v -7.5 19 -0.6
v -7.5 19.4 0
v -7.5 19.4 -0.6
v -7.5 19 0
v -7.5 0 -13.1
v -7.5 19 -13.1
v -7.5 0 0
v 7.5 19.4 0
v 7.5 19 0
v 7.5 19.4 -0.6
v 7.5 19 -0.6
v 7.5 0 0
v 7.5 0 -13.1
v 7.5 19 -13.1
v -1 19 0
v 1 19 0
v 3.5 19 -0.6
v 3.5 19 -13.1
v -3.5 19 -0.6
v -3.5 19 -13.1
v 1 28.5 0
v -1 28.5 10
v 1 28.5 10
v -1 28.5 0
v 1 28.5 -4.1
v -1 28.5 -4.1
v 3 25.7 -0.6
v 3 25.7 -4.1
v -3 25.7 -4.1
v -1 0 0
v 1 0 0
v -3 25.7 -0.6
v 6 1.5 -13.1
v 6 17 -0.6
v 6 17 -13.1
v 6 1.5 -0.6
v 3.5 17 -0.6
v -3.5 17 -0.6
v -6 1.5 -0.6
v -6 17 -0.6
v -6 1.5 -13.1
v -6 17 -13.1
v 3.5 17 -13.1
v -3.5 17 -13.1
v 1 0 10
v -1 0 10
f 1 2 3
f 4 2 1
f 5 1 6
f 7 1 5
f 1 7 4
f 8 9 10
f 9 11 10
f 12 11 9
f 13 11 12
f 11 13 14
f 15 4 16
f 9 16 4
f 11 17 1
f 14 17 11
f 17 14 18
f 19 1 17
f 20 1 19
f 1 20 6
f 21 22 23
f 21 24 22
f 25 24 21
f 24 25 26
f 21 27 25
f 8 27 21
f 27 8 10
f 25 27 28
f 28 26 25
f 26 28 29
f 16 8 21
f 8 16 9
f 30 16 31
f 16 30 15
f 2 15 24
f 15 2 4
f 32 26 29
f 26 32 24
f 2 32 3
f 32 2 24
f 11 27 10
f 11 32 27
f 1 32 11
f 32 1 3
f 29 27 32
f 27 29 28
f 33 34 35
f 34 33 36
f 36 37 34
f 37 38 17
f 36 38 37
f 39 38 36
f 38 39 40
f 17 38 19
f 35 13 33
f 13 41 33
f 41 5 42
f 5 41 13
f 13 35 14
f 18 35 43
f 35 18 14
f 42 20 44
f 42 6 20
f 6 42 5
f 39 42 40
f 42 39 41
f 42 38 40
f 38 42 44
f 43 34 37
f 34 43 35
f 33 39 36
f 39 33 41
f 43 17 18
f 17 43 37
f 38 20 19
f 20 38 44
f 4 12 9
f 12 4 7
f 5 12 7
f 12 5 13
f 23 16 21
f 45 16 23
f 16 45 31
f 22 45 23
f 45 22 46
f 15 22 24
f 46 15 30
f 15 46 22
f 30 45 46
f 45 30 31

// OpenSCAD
// file: ../config/colors.scad
/* RailEduKit/InteractiveSignallingLaboratory © 2025 by Martin Scheidt and contributors
 * License: CC-BY 4.0 - https://creativecommons.org/licenses/by/4.0/
 * Project description: The Interactive Signalling Laboratory is a tool for training in Rail
 * Applications to enhance the knowledge of control and signalling principles for rail transport systems.
 *
 * Module: config/colors.scad
 */

// component colors
BASE_COLOR = [0.25, 0.25, 0.25];// lighter black to see the shapes
INDICATOR_COLOR = "white";
ROUTE_COLOR = [0.255, 0.412, 0.882]; //[0.396, 0.467, 0.702];

METALLIC_GREY = [0.474, 0.482, 0.482];



// signal colors
ASPECT_CLEAR = "green";
ASPECT_APPROACH = "yellow";
ASPECT_STOP = "red";
// main file
/* RailEduKit/InteractiveSignallingLaboratory © 2025 by Martin Scheidt and contributors
 * License: CC-BY 4.0 - https://creativecommons.org/licenses/by/4.0/
 * Project description: The Interactive Signalling Laboratory is a tool for training in Rail
 * Applications to enhance the knowledge of control and signalling principles for rail transport systems.
 *
 * Module: switch_locker
 */

// this locker can be combined with the mechanical switch of BRIO https://www.brio.co.uk/en-GB/products/railway-toys/train-tracks/mechanical-switches-63334400

// Include configuration file
include <../config/global_variables.scad>
include <../config/colors.scad>

module wedge(y_value) {
    hull(){
        translate([0,0,-sl_wedge_height+nozzle_diameter/2])
        rotate([90,0,0])
        cylinder(d=nozzle_diameter, h= y_value);
        translate([-sl_wedge_width/2, -y_value, -0.2]) //sl_depth-y_value
        cube([sl_wedge_width, y_value, 0.2]);
    }
}

module half_circle(diameter) {
    difference() {
        sphere(d = diameter);
        translate([0, diameter/2, 0])
        cube([diameter, diameter, diameter],center=true);
    }
}

module brio_switch_handle() {
    // the half circle is needed, otherwise the locker moves upwards if you move the switch
    translate([0, 0, 0]) // y: handle_curve_h if you use half circle
    cube([brio_handle_diameter, brio_handle_depth, brio_handle_height]); // y: -handle_curve_h if you use half circle

    //brio sxis
    translate([(brio_handle_diameter-brio_axis_diameter)/2,brio_handle_depth,0])
    cube([brio_axis_diameter, 5, brio_handle_height]);

    // half circle
    //translate([(brio_handle_diameter)/2, handle_curve_h, (brio_handle_diameter)/2]) 
    //scale([1,handle_curve_h/((brio_handle_diameter)/2),1])
    //half_circle(brio_handle_diameter);

}

module barrier() {
    difference(){
        difference(){
            cube([sl_barrier_width, sl_barrier_depth, sl_barrier_height]);
            //TODO cut the cube to gain more flexibilaty while installation
            translate([wall_thickness,wall_thickness,0])
            brio_switch_handle();
        }
        // gap for better movement
        //translate([0,wall_thickness+handle_curve_h,0])
        //cube([sl_barrier_width,2,sl_barrier_height]);
    }

}

module handle(){
    cube([sl_handle_width, sl_handle_depth, sl_handle_height]);
}

module switch_locker() {
    color(ROUTE_COLOR) union(){
            /*     hull(){
            translate([-sl_width/2 + nozzle_diameter/2, nozzle_diameter/2, 0])
            cylinder(d = nozzle_diameter, h=sl_height);
            translate([sl_width/2-nozzle_diameter/2, nozzle_diameter/2, 0])
            cylinder(d = nozzle_diameter, h=sl_height);
            translate([0, sl_depth - nozzle_diameter/2, 0])
            cylinder(d = 5*nozzle_diameter, h=sl_height);
        } */
        difference(){
            hull(){
                translate([-sl_width/2,sl_barrier_depth,-sl_lock_height])
                cube([sl_width, 0.4, sl_lock_height]);
                translate([-sl_wedge_width/2, sl_depth-sl_wedge_depth, -sl_lock_height]) //sl_depth-y_value
                cube([sl_wedge_width, sl_wedge_depth, sl_lock_height]);
            }
            translate([-sl_barrier_width/2,sl_barrier_depth,-sl_lock_height])
            cube([sl_barrier_width, rail_well_width + 2*move_tolerance, sl_lock_height-sl_height]);
        }
        

        translate([-sl_barrier_width/2, 0, -sl_barrier_height])
        barrier();
        //translate([0,sl_depth,0])
        //wedge(sl_wedge_depth);
        //translate([0,sl_barrier_depth+sl_wedge_short+move_tolerance,0])
        //wedge(sl_wedge_short);
        translate([-sl_handle_width/2,0,0])
        handle();
    }
}


//brio_switch_handle();
switch_locker();
//wedge(sl_wedge_depth);
